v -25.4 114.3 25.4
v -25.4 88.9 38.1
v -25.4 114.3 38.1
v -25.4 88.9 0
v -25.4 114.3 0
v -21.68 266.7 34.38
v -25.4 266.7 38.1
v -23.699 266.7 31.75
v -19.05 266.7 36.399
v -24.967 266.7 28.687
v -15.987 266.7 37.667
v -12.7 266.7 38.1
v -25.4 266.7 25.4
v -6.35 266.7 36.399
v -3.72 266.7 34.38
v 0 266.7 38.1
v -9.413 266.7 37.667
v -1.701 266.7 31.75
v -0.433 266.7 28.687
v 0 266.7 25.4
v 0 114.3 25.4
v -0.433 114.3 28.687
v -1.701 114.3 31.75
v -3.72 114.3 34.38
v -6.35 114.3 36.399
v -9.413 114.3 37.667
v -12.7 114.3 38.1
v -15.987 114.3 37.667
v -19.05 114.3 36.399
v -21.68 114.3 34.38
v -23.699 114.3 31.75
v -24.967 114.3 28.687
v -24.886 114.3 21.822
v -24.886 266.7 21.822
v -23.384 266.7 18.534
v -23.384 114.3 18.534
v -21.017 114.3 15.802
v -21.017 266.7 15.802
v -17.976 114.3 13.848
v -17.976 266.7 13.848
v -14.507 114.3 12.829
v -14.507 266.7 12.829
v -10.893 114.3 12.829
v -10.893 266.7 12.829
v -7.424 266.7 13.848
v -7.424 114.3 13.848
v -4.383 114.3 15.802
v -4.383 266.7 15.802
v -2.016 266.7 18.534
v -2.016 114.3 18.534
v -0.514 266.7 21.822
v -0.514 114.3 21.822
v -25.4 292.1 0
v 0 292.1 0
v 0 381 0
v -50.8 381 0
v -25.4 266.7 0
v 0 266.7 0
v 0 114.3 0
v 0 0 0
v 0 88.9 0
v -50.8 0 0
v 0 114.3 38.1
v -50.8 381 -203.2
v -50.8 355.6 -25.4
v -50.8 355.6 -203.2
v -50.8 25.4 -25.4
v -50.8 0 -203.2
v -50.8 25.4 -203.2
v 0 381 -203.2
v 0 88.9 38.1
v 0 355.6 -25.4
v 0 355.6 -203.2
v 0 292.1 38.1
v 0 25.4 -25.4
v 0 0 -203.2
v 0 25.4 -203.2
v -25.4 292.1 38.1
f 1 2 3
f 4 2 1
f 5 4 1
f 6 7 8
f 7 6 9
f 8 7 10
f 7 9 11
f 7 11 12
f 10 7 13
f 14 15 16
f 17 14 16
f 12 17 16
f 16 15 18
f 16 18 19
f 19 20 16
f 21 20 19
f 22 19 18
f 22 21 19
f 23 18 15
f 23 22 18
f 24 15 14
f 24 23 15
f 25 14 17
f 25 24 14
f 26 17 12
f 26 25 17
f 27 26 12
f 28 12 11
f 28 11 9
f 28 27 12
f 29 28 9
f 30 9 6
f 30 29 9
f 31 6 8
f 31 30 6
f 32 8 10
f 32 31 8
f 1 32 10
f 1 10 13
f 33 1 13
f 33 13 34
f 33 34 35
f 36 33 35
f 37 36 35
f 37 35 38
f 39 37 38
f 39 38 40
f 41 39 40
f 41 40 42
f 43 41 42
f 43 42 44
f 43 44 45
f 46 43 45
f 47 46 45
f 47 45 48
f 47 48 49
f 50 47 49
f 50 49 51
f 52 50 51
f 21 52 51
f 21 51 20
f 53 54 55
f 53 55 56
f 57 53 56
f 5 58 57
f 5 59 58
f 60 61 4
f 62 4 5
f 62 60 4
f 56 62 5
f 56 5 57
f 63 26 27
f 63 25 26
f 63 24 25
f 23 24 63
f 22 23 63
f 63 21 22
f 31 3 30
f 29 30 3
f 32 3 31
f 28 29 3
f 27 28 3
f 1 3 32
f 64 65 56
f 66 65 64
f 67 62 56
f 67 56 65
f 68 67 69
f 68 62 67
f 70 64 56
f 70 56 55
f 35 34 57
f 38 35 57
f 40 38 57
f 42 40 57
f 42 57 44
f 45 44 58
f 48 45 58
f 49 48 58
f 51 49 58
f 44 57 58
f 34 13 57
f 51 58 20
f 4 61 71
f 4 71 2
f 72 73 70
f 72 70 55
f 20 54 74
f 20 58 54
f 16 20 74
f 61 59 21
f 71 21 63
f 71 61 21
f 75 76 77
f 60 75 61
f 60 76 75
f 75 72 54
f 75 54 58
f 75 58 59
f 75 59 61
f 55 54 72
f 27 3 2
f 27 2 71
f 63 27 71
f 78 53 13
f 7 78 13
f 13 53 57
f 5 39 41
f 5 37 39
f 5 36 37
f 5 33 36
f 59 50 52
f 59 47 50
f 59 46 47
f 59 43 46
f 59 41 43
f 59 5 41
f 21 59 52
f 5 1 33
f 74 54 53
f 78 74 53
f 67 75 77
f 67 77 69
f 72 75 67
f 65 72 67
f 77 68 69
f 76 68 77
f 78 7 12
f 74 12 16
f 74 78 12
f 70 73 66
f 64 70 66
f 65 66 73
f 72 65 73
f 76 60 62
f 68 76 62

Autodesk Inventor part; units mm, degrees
ref_plane "YZ Plane" through (0, 0, 0) normal (1, 0, 0) x (0, 1, 0)
ref_plane "XZ Plane" through (0, 0, 0) normal (0, 1, 0) x (-1, 0, 0)
ref_plane "XY Plane" through (0, 0, 0) normal (0, 0, 1) x (1, 0, 0)
sketch "Sketch1" plane through (0, 0, 0) normal (0, 1, 0) x (-1, 0, 0)
  line L0 (0, 0) -> (50.8, 0)
  line L1 (50.8, 0) -> (50.8, -203.2)
  line L2 (50.8, -203.2) -> (0, -203.2)
  line L3 (0, -203.2) -> (0, 0)
  dimension "d0" = 50.8
  dimension "d1" = 203.2
extrude "Extrusion1" add sketch "Sketch1" along normal blind 25.4
sketch "Sketch2" plane through (0, 25.4, 0) normal (0, 1, 0) x (1, 0, 0)
  line L0 (-50.8, 0) -> (0, 0) projected
  line L1 (0, 0) -> (0, 203.2) projected
  line L2 (-50.8, 0) -> (0, 0)
  line L3 (0, 0) -> (0, 25.4)
  line L4 (0, 25.4) -> (-50.8, 25.4)
  line L5 (-50.8, 25.4) -> (-50.8, 0)
  dimension "d4" = 25.4
extrude "Extrusion2" add sketch "Sketch2" along normal blind 330.2
sketch "Sketch3" plane through (0, 355.6, 0) normal (0, 1, 0) x (1, 0, 0)
  line L0 (0, 203.2) -> (-50.8, 203.2) projected
  line L1 (0, 0) -> (-50.8, 0)
  line L2 (-50.8, 0) -> (-50.8, 203.2)
  line L3 (-50.8, 203.2) -> (0, 203.2)
  line L4 (0, 203.2) -> (0, 0)
extrude "Extrusion3" add sketch "Sketch3" along normal blind 25.4
sketch "Sketch4" plane through (-50.8, 0, 0) normal (0, 0, 1) x (1, 0, 0)
  line L0 (50.8, 292.1) -> (25.4, 292.1)
  line L1 (25.4, 292.1) -> (25.4, 266.7)
  line L2 (25.4, 266.7) -> (50.8, 266.7)
  line L3 (50.8, 266.7) -> (50.8, 292.1)
  line L4 (50.8, 88.9) -> (25.4, 88.9)
  line L5 (25.4, 88.9) -> (25.4, 114.3)
  line L6 (25.4, 114.3) -> (50.8, 114.3)
  line L7 (50.8, 114.3) -> (50.8, 88.9)
  line L8 (50.8, 0) -> (0, 0) projected
  dimension "d19" = 152.4
  dimension "d20" = 25.4
  dimension "d21" = 25.4
  dimension "d22" = 88.9
extrude "Extrusion4" add sketch "Sketch4" along normal blind 38.1
sketch "Sketch6" plane through (-25.4, 114.3, 0) normal (0, 1, 0) x (1, 0, 0)
  circle A0 centre (12.7, -25.4) radius 12.7
  line L0 (25.4, 0) -> (25.4, -38.1) projected
  line L1 (25.4, -38.1) -> (0, -38.1) projected
  dimension "d23" = 25.4
  dimension "d24" = 12.7
  dimension "d25" = 12.7
extrude "Extrusion5" add sketch "Sketch6" along normal blind 158.75 contours A0
properties part number "hand"
